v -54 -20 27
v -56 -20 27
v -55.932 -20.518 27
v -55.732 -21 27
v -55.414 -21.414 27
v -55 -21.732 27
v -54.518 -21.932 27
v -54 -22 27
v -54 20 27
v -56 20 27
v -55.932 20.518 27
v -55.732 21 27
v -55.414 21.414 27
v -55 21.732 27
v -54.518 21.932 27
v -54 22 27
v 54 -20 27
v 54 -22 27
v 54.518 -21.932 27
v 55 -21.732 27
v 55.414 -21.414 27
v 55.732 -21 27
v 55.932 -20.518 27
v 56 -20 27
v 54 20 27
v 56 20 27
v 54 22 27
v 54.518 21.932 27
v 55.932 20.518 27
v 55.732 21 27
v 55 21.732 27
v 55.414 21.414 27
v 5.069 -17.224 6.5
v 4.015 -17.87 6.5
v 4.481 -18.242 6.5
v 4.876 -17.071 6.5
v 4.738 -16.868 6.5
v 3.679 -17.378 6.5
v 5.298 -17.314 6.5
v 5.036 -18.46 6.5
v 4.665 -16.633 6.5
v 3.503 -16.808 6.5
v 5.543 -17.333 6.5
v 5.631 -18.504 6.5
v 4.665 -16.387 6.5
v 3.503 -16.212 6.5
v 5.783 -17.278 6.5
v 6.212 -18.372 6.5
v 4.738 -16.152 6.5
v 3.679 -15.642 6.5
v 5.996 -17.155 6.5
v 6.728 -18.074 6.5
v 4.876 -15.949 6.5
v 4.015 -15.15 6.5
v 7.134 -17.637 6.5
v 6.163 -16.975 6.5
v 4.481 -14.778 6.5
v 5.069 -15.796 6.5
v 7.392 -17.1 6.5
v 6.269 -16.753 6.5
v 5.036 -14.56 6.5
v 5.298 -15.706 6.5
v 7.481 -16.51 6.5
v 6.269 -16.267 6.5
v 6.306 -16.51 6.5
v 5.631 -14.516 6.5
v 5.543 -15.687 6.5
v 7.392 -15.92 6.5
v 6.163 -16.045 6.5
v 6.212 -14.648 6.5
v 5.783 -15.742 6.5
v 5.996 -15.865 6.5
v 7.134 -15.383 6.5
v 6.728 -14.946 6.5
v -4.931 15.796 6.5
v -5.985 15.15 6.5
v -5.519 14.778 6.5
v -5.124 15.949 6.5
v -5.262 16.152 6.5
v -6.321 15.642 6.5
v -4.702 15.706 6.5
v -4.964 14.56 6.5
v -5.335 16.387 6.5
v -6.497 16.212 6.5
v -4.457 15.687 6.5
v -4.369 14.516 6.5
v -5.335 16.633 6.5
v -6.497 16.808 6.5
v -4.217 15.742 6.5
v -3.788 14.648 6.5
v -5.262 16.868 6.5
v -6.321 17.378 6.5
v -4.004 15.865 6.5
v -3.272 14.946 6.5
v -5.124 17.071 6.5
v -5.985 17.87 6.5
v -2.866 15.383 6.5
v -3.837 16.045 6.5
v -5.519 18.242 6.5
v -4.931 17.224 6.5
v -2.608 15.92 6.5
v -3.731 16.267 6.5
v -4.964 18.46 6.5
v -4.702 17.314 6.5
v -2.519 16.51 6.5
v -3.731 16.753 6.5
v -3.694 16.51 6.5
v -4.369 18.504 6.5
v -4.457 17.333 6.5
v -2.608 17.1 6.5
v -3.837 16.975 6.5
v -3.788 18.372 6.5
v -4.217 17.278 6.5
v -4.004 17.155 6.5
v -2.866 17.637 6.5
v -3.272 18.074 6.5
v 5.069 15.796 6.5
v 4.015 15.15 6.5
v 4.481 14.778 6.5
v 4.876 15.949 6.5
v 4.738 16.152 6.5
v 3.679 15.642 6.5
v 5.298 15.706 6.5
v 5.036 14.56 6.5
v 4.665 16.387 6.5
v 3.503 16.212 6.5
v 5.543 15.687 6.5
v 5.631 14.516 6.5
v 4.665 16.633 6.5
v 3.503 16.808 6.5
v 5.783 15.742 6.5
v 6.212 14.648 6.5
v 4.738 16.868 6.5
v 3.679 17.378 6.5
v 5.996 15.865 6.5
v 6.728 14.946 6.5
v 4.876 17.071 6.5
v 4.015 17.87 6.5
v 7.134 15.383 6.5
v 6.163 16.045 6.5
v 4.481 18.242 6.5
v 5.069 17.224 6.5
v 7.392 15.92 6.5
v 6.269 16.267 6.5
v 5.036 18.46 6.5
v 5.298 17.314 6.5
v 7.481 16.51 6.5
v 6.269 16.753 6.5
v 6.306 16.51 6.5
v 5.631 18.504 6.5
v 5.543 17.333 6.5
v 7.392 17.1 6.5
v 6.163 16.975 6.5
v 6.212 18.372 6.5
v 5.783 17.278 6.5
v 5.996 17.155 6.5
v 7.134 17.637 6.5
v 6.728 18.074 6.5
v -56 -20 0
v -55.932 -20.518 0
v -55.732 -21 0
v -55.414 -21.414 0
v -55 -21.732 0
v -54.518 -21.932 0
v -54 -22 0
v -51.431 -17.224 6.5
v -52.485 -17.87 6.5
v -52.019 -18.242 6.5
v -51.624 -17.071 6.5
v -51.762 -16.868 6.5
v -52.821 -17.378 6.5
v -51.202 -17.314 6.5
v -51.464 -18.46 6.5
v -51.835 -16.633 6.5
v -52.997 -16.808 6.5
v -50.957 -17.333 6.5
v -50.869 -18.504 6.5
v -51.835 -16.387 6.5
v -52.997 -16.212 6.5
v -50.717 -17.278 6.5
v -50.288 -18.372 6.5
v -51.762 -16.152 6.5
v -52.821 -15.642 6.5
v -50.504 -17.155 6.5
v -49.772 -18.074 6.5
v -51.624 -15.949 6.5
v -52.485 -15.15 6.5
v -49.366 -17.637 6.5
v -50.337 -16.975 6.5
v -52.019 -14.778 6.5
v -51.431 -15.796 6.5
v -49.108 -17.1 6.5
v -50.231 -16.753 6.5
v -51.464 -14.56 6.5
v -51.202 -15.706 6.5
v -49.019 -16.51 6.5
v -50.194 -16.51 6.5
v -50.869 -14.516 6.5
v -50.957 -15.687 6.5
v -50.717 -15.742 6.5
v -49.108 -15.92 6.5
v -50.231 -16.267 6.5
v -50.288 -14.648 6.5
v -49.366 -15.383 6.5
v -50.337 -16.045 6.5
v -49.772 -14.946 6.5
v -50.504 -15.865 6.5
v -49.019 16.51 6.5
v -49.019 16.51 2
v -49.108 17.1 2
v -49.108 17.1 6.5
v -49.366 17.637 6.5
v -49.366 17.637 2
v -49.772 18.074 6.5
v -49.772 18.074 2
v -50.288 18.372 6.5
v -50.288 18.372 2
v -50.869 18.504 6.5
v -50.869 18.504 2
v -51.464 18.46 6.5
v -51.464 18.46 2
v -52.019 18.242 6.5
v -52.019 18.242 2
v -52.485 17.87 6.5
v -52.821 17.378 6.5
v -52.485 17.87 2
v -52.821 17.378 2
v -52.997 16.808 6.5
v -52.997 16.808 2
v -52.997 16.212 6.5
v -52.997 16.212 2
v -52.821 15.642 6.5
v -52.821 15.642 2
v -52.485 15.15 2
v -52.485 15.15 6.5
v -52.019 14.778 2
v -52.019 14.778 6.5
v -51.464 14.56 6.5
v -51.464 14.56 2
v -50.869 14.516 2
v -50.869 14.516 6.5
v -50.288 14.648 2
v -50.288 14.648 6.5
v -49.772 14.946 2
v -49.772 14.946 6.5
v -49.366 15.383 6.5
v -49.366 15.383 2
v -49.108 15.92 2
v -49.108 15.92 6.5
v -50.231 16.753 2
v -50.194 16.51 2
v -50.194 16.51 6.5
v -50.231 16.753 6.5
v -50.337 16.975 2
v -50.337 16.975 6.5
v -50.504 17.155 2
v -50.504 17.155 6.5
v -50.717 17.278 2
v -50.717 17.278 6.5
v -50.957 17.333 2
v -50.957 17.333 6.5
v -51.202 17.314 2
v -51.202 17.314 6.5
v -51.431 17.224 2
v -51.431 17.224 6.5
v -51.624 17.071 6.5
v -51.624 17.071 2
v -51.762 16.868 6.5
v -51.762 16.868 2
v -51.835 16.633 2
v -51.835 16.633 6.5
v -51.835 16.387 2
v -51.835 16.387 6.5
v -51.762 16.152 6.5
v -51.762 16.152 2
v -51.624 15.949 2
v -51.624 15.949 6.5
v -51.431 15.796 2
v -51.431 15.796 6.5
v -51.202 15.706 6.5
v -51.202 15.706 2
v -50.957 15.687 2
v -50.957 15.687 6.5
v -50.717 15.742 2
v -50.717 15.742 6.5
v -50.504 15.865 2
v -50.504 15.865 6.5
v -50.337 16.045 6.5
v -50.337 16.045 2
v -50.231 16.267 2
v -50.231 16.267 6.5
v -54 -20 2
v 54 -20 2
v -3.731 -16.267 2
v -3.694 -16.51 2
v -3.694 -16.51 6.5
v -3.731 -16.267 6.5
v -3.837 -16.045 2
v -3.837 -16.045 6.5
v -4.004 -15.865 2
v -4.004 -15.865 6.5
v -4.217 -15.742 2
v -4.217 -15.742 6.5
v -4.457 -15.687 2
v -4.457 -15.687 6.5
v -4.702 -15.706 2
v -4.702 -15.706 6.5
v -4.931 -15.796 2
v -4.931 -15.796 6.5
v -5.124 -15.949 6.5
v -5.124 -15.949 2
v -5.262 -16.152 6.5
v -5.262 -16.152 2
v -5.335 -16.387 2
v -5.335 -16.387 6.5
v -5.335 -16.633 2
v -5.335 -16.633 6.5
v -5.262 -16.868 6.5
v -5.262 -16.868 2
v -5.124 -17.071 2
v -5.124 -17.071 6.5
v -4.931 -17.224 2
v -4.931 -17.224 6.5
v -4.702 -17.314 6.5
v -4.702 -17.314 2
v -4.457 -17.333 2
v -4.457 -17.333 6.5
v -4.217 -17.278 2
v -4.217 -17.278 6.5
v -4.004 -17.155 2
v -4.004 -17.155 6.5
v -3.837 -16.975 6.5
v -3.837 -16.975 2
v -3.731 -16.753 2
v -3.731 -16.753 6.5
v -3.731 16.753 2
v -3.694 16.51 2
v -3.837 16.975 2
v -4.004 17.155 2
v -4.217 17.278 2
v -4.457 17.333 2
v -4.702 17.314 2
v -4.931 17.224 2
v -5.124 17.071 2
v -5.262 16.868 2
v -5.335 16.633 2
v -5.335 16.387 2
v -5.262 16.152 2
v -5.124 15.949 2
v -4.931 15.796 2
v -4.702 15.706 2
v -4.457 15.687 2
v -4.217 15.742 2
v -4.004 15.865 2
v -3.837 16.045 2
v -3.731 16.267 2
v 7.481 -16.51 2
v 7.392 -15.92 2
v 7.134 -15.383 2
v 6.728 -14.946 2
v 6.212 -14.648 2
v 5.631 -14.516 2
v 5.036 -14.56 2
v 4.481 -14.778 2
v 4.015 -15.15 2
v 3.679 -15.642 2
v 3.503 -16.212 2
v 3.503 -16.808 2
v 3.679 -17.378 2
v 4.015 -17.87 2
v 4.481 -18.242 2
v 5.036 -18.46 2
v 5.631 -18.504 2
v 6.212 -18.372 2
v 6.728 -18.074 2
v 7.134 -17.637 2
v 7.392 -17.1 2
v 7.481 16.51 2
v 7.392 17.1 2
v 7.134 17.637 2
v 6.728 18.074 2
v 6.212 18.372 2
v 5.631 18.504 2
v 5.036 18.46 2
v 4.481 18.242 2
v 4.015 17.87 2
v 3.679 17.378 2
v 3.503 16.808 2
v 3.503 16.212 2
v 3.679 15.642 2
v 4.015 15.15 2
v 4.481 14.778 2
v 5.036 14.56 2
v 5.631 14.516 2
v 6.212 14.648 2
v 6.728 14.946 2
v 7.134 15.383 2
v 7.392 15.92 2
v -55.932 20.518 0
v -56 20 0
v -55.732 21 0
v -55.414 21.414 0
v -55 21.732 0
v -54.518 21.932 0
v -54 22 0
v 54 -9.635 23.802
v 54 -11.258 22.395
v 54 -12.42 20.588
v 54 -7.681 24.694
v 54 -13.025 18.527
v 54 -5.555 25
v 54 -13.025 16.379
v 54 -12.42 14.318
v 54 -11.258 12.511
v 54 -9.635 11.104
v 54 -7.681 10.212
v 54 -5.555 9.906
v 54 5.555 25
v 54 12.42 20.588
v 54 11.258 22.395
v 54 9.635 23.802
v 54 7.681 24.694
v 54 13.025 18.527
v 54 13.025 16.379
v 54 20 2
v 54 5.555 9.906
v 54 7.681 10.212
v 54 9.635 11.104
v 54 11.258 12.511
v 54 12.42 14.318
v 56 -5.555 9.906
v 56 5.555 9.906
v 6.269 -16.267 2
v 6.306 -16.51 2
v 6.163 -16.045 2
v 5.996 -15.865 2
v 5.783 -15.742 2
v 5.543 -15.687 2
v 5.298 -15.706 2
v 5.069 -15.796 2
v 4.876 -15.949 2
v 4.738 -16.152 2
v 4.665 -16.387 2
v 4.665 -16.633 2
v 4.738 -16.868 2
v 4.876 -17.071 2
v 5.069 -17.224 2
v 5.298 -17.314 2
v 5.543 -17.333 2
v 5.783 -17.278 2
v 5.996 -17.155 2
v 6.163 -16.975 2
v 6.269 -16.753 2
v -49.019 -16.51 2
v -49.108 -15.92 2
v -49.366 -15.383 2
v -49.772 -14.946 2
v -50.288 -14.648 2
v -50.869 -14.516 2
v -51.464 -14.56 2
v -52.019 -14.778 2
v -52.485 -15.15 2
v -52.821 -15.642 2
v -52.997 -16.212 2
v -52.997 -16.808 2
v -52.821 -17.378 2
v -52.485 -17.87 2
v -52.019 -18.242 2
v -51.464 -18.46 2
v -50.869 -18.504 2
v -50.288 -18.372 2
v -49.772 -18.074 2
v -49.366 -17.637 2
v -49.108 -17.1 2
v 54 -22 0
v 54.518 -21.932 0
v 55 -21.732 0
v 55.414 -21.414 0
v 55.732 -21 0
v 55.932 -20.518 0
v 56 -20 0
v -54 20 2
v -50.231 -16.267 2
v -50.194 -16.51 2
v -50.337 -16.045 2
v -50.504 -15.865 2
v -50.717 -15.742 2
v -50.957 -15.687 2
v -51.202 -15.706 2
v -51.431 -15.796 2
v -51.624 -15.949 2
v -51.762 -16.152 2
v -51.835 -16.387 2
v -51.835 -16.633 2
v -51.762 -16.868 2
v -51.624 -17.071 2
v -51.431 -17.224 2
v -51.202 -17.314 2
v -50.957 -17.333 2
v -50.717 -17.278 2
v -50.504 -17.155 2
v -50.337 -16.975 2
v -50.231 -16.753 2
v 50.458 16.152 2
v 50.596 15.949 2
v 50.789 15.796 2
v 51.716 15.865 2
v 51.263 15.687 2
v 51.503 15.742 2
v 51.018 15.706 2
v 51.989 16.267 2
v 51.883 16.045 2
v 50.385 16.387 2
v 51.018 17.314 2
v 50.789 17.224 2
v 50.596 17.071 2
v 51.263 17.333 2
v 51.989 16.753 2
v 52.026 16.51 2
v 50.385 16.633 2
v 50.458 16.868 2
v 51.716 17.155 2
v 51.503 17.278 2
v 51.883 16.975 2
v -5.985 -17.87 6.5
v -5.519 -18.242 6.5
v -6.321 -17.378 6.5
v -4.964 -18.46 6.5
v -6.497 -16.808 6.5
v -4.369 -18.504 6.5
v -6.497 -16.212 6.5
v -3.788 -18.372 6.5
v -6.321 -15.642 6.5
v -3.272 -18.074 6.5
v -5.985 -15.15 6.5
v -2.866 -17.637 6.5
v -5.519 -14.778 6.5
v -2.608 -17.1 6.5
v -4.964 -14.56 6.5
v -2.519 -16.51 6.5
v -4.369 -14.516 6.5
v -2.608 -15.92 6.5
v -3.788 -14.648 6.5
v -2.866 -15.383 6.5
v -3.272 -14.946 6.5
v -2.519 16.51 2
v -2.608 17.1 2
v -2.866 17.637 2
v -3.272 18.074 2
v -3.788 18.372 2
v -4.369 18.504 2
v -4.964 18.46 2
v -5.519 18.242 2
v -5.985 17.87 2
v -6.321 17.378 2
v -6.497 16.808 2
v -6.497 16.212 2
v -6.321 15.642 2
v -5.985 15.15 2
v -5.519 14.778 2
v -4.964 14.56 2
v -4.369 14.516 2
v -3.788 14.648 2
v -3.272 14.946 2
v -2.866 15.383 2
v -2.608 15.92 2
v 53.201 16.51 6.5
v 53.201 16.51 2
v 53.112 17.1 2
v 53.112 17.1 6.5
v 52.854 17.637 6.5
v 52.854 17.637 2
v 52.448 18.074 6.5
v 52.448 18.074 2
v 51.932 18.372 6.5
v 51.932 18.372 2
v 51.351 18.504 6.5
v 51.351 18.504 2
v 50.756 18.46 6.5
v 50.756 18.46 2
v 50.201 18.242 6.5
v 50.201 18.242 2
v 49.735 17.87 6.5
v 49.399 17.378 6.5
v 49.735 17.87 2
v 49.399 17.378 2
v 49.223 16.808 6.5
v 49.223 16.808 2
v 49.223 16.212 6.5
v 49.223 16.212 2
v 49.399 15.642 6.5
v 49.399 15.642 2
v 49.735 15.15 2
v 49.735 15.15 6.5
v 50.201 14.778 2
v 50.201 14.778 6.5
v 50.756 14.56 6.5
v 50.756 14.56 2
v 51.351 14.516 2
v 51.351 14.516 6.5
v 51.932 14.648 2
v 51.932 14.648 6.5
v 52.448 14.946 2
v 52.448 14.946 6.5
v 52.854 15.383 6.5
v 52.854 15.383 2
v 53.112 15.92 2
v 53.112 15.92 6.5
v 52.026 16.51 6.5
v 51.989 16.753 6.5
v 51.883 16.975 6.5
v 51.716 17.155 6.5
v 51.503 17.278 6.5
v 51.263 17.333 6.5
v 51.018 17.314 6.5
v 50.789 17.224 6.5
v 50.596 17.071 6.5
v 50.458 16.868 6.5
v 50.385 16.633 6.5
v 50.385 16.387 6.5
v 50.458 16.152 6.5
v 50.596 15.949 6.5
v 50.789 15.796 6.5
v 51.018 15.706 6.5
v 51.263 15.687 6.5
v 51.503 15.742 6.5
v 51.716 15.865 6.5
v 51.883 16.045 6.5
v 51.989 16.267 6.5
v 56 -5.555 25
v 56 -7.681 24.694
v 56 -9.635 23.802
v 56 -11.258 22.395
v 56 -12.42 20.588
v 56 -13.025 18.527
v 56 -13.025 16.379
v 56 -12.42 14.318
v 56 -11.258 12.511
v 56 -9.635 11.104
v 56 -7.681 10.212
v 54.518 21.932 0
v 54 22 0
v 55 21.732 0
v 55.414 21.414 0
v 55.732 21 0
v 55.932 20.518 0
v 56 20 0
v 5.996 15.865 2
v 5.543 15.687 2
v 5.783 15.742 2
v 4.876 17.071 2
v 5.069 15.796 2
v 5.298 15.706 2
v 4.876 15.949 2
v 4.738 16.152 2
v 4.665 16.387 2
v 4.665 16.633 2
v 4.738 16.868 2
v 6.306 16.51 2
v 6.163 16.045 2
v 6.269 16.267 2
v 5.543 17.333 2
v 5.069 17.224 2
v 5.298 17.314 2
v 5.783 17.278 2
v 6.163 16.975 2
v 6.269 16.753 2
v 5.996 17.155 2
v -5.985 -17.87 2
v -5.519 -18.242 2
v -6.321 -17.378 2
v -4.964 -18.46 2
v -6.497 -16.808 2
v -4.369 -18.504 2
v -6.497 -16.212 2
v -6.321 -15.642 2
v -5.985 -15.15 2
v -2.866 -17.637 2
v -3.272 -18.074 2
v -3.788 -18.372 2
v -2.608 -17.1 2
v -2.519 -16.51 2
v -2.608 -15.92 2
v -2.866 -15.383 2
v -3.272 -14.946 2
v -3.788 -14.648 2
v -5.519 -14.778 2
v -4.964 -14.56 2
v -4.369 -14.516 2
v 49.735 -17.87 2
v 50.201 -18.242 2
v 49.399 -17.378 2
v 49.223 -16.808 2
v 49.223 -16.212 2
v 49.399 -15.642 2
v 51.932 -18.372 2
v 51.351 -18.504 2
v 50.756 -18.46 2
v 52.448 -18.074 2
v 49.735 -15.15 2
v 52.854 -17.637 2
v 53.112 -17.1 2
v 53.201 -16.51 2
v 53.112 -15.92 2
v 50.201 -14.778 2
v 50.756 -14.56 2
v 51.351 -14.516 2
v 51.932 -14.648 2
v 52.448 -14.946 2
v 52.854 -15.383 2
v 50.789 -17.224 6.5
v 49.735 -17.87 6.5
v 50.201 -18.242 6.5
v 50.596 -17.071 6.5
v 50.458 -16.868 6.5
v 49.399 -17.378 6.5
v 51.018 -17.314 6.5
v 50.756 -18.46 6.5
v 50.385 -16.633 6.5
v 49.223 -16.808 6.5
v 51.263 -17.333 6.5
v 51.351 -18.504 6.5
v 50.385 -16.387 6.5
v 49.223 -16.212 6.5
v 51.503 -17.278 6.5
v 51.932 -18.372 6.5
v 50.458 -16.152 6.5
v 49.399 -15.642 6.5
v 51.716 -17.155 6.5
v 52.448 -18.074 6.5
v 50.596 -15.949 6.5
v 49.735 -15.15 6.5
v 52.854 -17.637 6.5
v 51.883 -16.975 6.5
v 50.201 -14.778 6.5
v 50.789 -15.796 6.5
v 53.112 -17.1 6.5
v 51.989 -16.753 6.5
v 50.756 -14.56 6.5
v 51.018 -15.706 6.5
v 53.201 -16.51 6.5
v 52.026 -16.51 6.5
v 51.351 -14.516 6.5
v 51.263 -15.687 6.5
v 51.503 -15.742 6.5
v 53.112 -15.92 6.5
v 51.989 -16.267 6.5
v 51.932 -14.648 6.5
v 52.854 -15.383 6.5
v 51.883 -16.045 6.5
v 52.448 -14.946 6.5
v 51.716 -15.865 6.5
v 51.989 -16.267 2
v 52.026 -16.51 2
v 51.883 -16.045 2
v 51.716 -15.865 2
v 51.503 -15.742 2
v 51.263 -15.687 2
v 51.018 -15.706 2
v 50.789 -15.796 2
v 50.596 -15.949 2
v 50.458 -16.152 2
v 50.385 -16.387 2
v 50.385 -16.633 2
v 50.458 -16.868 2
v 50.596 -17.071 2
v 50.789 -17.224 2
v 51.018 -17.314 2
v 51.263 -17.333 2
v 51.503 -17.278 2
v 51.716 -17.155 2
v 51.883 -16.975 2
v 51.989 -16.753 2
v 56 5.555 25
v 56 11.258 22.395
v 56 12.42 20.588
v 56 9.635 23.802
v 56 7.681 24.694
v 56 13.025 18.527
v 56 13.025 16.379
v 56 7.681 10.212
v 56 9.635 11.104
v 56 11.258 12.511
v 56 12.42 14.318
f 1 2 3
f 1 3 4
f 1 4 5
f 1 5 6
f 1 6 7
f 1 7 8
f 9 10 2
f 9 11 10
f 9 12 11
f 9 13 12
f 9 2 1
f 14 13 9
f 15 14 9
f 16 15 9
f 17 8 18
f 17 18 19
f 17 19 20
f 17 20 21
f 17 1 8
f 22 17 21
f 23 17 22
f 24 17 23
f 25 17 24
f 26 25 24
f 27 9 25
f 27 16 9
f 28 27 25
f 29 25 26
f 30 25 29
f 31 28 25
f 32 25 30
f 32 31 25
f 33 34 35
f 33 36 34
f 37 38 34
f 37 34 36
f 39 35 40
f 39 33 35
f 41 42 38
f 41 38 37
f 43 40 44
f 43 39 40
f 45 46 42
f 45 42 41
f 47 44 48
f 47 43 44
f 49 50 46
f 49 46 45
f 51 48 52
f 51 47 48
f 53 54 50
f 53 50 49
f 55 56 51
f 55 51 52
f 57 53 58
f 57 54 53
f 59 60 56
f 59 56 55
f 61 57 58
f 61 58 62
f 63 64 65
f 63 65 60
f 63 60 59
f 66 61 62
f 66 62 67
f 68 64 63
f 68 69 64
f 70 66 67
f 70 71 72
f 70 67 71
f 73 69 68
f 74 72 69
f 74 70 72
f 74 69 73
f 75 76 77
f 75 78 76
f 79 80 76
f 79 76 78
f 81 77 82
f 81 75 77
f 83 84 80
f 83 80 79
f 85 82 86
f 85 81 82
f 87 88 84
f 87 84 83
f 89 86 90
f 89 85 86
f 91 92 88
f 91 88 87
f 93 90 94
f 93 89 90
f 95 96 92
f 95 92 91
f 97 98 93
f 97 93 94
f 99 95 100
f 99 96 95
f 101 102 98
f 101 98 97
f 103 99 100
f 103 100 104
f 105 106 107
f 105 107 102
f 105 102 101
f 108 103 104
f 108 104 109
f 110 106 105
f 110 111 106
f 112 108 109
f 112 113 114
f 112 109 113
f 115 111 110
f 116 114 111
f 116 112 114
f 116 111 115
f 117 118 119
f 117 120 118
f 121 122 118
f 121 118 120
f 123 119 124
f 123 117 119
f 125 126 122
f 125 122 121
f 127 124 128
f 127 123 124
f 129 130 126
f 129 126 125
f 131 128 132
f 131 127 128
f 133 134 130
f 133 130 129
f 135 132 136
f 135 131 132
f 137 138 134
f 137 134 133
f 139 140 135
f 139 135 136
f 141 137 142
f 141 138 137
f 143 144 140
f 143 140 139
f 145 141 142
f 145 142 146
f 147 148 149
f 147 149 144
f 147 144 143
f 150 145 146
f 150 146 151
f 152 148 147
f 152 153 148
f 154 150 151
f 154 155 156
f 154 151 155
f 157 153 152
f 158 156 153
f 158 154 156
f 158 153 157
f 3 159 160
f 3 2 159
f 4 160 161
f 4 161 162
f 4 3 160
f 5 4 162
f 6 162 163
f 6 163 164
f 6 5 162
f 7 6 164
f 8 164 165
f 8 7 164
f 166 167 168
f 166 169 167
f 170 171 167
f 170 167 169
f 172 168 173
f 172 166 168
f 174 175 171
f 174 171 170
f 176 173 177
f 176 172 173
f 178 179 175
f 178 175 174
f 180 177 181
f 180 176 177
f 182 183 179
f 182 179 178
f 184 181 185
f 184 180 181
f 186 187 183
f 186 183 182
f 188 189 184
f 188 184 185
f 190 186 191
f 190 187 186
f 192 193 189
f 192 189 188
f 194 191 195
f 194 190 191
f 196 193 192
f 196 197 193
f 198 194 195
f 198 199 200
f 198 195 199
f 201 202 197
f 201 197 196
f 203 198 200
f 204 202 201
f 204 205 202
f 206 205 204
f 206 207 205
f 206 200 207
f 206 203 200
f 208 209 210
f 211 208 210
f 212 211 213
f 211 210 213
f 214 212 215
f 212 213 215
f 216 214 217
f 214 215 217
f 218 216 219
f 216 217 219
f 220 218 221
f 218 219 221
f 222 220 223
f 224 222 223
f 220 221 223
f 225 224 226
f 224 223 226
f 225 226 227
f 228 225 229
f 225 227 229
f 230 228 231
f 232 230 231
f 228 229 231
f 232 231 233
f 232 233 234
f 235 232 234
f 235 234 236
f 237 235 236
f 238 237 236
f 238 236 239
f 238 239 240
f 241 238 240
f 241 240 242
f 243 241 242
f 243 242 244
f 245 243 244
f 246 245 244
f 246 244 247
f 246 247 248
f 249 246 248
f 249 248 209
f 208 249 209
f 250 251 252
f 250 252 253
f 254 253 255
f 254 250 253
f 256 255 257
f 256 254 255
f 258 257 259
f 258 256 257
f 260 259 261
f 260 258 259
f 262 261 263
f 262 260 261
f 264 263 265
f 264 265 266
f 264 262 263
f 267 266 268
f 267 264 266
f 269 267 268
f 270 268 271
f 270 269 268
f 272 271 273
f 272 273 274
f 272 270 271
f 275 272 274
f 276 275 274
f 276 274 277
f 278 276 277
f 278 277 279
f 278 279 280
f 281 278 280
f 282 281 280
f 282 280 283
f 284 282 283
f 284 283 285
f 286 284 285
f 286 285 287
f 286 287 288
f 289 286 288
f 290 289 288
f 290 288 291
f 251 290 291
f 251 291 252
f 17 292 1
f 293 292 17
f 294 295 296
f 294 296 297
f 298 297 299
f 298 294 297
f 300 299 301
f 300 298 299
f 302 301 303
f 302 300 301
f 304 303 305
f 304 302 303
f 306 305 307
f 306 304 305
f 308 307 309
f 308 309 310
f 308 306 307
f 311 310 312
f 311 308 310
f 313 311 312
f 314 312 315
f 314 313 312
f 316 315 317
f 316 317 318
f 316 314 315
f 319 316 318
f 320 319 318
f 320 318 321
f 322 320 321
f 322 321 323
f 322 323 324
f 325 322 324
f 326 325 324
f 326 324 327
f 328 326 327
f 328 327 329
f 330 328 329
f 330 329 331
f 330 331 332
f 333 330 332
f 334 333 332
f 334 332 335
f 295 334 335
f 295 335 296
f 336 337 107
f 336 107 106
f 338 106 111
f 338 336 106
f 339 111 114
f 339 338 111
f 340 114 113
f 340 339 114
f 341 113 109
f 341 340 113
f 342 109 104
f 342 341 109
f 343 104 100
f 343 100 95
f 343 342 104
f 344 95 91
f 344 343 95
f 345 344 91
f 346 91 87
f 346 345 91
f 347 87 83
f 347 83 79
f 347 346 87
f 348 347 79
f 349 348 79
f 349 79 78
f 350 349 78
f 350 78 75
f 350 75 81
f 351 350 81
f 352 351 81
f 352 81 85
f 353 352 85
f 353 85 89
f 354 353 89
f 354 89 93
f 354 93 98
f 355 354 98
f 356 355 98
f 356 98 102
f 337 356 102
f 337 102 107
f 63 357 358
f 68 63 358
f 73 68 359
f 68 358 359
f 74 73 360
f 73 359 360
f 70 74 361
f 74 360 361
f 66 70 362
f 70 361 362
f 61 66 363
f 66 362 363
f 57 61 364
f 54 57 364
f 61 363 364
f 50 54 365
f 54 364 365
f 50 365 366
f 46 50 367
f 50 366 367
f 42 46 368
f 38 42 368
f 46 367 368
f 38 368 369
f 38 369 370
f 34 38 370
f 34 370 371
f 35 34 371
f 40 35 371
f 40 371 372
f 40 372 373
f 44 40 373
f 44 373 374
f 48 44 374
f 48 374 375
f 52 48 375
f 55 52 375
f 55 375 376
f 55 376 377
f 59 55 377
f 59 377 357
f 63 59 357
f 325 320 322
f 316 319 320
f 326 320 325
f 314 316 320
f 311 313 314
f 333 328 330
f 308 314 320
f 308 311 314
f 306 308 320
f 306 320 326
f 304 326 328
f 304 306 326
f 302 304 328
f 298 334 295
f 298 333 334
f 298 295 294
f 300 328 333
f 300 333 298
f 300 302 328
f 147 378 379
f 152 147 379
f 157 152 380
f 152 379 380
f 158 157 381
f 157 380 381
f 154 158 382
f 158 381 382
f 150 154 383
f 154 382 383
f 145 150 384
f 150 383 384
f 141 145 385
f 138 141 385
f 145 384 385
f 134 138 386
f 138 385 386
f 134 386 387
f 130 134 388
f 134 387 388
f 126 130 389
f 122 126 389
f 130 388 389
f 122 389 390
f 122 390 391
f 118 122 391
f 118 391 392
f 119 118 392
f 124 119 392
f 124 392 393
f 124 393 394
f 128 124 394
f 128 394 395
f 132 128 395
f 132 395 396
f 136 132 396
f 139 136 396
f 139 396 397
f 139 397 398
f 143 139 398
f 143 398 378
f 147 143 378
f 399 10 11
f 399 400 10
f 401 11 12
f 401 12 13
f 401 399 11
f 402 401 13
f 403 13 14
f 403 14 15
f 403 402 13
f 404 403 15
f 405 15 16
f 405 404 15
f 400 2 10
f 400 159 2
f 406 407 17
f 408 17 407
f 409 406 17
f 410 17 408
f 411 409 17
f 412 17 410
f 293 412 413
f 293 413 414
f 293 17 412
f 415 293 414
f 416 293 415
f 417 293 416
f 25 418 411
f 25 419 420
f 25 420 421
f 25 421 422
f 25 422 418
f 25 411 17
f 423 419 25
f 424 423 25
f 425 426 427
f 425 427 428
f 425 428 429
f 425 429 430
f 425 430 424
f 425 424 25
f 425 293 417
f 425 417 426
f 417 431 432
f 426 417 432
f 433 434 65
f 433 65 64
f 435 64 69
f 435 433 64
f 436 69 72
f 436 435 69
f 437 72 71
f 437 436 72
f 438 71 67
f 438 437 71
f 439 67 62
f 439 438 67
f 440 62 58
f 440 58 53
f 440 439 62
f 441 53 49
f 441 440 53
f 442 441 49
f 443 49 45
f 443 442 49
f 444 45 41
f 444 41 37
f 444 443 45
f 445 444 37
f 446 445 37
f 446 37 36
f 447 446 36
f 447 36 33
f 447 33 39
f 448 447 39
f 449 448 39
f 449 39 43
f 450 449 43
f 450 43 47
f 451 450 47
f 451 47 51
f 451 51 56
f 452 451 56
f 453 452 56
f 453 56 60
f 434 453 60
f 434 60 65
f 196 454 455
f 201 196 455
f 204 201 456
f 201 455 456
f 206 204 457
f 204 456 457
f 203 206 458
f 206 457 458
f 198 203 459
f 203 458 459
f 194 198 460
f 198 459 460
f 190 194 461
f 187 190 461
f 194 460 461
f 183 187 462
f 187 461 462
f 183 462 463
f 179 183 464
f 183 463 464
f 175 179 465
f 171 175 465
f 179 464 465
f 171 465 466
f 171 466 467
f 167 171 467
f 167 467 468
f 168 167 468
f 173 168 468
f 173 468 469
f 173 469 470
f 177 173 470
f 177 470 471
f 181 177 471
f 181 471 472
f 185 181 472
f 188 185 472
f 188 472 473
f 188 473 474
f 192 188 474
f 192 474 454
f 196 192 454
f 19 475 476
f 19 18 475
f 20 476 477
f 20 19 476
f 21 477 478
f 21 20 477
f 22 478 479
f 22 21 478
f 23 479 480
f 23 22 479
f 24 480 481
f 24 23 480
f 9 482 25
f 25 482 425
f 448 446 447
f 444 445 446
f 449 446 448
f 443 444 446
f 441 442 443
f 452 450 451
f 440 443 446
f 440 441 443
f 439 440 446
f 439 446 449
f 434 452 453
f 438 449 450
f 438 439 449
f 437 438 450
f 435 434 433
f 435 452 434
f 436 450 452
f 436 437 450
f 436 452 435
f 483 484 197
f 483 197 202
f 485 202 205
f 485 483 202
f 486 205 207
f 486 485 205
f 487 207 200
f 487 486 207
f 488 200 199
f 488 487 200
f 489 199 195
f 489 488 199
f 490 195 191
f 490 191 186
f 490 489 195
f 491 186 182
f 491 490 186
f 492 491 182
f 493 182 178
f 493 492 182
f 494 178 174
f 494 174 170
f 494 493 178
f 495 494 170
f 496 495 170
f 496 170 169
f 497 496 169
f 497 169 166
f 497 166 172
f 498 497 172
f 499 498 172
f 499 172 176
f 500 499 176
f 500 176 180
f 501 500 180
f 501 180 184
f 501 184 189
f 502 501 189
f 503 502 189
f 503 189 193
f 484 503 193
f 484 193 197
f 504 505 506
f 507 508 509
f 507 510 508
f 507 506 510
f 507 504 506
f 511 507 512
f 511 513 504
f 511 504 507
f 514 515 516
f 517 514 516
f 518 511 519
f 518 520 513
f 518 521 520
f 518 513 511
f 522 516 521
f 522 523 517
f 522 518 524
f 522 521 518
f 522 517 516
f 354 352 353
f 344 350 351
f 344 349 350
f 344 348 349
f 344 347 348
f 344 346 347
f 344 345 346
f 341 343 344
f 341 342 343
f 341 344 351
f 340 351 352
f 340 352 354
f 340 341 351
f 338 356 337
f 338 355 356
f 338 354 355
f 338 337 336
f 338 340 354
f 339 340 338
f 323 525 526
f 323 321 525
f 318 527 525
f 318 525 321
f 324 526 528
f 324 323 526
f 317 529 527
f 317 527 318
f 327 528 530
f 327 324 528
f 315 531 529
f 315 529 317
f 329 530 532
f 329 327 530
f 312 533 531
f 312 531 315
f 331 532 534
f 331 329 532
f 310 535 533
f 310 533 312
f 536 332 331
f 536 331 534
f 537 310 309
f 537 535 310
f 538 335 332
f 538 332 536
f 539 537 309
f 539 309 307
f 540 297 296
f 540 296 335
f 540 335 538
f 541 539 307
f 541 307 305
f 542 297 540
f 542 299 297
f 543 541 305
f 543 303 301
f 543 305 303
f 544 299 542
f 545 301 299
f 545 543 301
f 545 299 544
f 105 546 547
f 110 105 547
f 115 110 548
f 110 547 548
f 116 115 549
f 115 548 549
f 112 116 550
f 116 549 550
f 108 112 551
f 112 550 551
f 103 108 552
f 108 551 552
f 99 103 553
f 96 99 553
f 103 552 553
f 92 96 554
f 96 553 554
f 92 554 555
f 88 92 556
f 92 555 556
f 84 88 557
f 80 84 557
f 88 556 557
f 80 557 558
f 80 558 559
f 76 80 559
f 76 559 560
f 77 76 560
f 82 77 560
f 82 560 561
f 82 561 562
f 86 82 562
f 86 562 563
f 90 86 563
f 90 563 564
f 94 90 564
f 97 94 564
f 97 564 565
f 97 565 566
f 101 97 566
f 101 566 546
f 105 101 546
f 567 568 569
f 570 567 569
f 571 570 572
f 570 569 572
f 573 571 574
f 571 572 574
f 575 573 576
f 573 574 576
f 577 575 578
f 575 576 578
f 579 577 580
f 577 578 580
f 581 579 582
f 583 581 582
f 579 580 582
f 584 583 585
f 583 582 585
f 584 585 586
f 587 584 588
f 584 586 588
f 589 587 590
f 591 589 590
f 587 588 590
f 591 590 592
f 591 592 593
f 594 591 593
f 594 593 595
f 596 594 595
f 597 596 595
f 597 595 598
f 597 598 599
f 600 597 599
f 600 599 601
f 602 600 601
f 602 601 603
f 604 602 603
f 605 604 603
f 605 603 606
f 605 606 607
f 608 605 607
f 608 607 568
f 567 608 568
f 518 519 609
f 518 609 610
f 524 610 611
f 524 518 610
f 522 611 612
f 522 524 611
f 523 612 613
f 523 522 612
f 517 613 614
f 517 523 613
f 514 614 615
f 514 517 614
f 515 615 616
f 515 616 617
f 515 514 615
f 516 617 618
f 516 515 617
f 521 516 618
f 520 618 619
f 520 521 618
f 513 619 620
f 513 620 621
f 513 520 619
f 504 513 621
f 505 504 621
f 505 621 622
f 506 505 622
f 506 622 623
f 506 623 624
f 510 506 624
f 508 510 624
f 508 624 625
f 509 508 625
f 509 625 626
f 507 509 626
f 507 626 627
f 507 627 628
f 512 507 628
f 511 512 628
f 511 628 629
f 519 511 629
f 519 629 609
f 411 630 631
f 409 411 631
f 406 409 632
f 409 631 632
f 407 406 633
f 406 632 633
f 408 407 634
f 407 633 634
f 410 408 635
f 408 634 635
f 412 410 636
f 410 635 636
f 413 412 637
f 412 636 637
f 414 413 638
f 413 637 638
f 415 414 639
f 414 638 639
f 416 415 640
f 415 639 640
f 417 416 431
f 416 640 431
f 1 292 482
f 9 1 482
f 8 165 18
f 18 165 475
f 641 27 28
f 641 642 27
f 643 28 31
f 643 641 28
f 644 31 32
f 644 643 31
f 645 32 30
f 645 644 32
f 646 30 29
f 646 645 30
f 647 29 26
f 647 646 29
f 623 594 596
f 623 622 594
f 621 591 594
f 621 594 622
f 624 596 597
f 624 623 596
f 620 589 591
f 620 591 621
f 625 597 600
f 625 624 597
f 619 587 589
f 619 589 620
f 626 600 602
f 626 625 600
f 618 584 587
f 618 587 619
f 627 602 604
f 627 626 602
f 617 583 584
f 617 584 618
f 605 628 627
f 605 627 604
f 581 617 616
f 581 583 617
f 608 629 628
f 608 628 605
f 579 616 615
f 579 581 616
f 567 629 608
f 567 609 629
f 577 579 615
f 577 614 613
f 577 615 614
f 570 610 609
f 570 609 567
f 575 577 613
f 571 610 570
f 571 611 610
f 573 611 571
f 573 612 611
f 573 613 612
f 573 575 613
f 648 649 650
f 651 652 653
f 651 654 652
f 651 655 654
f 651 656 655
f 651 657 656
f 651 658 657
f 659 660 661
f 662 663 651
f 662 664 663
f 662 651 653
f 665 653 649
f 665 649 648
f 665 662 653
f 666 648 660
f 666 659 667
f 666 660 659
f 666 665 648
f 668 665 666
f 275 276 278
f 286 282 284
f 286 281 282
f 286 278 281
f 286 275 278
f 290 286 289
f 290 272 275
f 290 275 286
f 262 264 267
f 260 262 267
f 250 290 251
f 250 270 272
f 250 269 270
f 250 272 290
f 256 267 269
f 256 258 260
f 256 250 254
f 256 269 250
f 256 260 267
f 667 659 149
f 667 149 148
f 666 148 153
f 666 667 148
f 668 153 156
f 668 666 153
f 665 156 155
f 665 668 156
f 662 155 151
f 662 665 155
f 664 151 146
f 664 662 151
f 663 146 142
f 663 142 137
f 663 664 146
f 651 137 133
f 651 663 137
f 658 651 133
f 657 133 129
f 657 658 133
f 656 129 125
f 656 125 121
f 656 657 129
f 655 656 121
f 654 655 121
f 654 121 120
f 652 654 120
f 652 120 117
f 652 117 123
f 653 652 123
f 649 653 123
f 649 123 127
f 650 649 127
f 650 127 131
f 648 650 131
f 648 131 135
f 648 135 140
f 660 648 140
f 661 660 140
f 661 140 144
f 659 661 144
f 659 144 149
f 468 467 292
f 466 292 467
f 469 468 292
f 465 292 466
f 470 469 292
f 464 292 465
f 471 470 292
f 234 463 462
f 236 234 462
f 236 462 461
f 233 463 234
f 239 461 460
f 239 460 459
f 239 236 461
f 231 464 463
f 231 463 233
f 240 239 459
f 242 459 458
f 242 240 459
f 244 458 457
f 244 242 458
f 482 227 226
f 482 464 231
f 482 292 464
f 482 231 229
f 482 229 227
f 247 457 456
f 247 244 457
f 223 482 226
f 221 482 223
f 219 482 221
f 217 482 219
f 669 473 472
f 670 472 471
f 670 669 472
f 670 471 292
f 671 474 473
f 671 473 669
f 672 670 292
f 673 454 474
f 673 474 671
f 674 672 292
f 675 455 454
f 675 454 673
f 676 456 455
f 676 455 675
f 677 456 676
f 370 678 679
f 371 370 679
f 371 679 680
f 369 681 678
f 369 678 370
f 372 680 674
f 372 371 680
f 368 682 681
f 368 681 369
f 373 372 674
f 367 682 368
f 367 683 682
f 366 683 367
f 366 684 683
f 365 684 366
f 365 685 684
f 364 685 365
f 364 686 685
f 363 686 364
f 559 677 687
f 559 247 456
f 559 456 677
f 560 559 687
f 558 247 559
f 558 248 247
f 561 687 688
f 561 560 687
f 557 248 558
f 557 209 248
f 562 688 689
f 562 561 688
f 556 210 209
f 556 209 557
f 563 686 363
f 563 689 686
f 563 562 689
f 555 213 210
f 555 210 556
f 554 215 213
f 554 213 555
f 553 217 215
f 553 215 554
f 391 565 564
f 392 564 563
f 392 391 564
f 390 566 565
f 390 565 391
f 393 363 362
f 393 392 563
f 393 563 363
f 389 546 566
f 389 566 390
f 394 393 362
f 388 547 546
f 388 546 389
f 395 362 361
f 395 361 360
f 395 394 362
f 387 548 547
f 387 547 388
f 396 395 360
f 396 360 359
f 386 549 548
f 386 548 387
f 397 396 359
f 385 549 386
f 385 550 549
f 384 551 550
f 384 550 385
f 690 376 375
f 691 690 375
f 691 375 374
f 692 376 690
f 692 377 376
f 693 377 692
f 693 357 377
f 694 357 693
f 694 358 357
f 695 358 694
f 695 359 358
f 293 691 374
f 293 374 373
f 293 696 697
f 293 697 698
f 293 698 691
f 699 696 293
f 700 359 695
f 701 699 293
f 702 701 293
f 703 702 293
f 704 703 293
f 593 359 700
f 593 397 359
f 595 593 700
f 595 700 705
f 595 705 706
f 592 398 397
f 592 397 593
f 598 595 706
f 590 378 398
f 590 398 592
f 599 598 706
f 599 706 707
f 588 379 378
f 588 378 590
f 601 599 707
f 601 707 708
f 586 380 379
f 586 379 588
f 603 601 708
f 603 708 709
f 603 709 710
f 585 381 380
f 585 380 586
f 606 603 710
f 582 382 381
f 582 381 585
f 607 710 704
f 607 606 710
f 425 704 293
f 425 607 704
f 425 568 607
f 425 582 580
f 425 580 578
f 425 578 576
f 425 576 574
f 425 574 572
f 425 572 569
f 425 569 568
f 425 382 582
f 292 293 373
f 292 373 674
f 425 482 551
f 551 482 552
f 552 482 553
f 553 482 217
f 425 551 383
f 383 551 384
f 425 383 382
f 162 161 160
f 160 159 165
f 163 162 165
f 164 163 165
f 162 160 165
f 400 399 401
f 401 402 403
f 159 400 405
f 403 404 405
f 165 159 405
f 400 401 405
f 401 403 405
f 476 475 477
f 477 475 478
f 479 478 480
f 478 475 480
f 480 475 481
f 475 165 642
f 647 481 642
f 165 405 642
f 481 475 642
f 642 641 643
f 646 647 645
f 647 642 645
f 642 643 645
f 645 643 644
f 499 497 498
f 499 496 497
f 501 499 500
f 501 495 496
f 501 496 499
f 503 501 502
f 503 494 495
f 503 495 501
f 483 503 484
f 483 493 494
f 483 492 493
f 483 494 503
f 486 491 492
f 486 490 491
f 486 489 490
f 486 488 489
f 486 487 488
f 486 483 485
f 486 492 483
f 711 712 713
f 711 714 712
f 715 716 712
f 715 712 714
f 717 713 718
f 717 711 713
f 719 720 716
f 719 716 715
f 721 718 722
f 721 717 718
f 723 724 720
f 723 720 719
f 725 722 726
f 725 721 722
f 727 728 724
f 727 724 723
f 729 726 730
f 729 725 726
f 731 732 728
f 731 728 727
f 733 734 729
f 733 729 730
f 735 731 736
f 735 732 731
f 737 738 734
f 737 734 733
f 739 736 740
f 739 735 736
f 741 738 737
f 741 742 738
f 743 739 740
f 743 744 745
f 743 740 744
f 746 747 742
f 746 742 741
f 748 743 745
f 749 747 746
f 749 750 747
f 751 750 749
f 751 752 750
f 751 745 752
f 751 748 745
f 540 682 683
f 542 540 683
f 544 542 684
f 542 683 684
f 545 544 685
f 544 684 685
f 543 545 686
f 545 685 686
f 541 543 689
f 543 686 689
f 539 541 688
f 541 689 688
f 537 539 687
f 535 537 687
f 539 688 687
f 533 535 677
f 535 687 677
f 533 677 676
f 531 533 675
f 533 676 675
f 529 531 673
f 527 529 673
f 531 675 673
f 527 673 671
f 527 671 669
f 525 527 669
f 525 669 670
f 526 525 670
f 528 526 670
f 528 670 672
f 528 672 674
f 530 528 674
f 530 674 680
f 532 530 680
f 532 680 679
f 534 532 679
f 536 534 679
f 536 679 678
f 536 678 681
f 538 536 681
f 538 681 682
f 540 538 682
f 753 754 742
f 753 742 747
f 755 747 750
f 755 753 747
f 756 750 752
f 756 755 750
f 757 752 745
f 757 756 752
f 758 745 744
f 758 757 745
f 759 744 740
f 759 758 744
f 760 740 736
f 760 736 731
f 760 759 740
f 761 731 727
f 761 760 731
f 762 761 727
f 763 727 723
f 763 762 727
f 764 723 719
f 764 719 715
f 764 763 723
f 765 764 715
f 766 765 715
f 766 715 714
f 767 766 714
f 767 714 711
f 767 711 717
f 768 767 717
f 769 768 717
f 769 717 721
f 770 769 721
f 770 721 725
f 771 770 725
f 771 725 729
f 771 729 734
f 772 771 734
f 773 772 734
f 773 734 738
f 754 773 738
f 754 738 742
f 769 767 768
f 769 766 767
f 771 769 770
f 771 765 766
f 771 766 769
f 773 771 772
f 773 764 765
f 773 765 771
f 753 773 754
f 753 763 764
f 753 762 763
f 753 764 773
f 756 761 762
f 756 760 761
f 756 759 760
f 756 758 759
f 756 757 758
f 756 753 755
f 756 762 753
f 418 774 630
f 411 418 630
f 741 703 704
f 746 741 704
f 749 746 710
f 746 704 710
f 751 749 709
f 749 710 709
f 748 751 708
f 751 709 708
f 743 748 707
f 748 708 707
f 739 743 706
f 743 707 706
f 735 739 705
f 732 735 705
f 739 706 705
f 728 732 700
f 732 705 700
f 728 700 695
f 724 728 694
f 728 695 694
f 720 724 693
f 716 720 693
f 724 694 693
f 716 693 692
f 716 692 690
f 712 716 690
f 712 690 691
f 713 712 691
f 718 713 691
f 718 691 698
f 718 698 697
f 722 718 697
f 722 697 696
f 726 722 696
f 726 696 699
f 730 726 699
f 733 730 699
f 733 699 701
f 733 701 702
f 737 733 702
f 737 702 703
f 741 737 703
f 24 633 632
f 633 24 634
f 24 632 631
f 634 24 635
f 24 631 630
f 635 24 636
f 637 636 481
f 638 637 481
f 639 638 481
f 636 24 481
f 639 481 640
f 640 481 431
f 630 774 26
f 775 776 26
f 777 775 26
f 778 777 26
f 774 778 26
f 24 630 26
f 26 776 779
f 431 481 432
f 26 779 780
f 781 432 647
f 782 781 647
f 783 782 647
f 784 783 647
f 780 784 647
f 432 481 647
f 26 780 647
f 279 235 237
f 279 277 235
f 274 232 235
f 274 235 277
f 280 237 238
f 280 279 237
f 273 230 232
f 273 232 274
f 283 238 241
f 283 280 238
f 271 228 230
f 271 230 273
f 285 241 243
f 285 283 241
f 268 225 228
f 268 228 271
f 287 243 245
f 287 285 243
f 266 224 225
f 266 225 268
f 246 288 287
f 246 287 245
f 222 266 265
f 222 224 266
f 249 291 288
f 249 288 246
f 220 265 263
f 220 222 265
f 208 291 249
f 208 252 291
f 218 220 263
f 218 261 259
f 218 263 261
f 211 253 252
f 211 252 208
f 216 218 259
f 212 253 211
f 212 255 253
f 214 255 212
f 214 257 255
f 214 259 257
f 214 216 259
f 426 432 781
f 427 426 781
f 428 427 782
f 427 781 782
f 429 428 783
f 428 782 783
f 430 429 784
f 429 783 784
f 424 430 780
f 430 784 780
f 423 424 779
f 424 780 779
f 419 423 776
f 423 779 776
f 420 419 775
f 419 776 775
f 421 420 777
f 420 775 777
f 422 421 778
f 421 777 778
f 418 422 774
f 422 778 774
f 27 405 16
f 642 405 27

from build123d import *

# Parameters (mm, degrees)
SKETCH001_W   = 112
SKETCH001_H   = 44
PAD_DEPTH     = 2
SKETCH_R      = 2
SKETCH_R_2    = 0.825
PAD001_DEPTH  = 6.5
SKETCH002_W   = 112
SKETCH002_H   = 44
SKETCH002_W_2 = 108
SKETCH002_H_2 = 40
PAD002_DEPTH  = 25
POCKET_DEPTH  = 5
FILLET_R      = 2


with BuildPart() as part:
    # Sketch001 → Pad (new body)
    with BuildSketch(Plane.XY):
        Rectangle(SKETCH001_W, SKETCH001_H)
    extrude(amount=PAD_DEPTH)

    # Sketch → Pad001 (join)
    with BuildSketch(Plane.XY):
        with Locations((51.201135, 16.51)):
            Circle(SKETCH_R)
        with Locations((51.201135, 16.51)):
            Circle(SKETCH_R_2, mode=Mode.SUBTRACT)
        with Locations((5.481135, 16.51)):
            Circle(SKETCH_R)
        with Locations((5.481135, 16.51)):
            Circle(SKETCH_R_2, mode=Mode.SUBTRACT)
        with Locations((-4.518865, 16.51)):
            Circle(SKETCH_R)
        with Locations((-4.518865, 16.51)):
            Circle(SKETCH_R_2, mode=Mode.SUBTRACT)
        with Locations((-51.018865, 16.51)):
            Circle(SKETCH_R)
        with Locations((-51.018865, 16.51)):
            Circle(SKETCH_R_2, mode=Mode.SUBTRACT)
        with Locations((-51.018865, -16.51)):
            Circle(SKETCH_R)
        with Locations((-51.018865, -16.51)):
            Circle(SKETCH_R_2, mode=Mode.SUBTRACT)
        with Locations((-4.518865, -16.51)):
            Circle(SKETCH_R)
        with Locations((-4.518865, -16.51)):
            Circle(SKETCH_R_2, mode=Mode.SUBTRACT)
        with Locations((5.481135, -16.51)):
            Circle(SKETCH_R)
        with Locations((5.481135, -16.51)):
            Circle(SKETCH_R_2, mode=Mode.SUBTRACT)
        with Locations((51.201135, -16.51)):
            Circle(SKETCH_R)
        with Locations((51.201135, -16.51)):
            Circle(SKETCH_R_2, mode=Mode.SUBTRACT)
    extrude(amount=PAD001_DEPTH)

    # Sketch002 (on Face5 of Pad001) → Pad002 (join)
    with BuildSketch(Plane.XY.offset(2)):
        Rectangle(SKETCH002_W, SKETCH002_H)
        Rectangle(SKETCH002_W_2, SKETCH002_H_2, mode=Mode.SUBTRACT)
    extrude(amount=PAD002_DEPTH)

    # Sketch003 (on Face8 of Pad002) → Pocket (cut)
    with BuildSketch(Plane.YZ.offset(56)):
        with BuildLine():
            ThreePointArc((-5.554717, 25), (-13.101596, 17.453121), (-5.554717, 9.906242))
            Line((-5.554717, 9.906242), (5.554717, 9.906242))
            ThreePointArc((5.554717, 9.906242), (13.101596, 17.453121), (5.554717, 25))
            Line((5.554717, 25), (-5.554717, 25))
        make_face()
    extrude(amount=-POCKET_DEPTH, mode=Mode.SUBTRACT)

    # Fillet
    fillet_edges = [part.edges().sort_by_distance(p)[0] for p in [
        (56, -22, 14.5),
        (56, 22, 14.5),
        (-56, -22, 14.5),
        (-56, 22, 14.5),
    ]]
    fillet(fillet_edges, radius=FILLET_R)


solid = part.part
